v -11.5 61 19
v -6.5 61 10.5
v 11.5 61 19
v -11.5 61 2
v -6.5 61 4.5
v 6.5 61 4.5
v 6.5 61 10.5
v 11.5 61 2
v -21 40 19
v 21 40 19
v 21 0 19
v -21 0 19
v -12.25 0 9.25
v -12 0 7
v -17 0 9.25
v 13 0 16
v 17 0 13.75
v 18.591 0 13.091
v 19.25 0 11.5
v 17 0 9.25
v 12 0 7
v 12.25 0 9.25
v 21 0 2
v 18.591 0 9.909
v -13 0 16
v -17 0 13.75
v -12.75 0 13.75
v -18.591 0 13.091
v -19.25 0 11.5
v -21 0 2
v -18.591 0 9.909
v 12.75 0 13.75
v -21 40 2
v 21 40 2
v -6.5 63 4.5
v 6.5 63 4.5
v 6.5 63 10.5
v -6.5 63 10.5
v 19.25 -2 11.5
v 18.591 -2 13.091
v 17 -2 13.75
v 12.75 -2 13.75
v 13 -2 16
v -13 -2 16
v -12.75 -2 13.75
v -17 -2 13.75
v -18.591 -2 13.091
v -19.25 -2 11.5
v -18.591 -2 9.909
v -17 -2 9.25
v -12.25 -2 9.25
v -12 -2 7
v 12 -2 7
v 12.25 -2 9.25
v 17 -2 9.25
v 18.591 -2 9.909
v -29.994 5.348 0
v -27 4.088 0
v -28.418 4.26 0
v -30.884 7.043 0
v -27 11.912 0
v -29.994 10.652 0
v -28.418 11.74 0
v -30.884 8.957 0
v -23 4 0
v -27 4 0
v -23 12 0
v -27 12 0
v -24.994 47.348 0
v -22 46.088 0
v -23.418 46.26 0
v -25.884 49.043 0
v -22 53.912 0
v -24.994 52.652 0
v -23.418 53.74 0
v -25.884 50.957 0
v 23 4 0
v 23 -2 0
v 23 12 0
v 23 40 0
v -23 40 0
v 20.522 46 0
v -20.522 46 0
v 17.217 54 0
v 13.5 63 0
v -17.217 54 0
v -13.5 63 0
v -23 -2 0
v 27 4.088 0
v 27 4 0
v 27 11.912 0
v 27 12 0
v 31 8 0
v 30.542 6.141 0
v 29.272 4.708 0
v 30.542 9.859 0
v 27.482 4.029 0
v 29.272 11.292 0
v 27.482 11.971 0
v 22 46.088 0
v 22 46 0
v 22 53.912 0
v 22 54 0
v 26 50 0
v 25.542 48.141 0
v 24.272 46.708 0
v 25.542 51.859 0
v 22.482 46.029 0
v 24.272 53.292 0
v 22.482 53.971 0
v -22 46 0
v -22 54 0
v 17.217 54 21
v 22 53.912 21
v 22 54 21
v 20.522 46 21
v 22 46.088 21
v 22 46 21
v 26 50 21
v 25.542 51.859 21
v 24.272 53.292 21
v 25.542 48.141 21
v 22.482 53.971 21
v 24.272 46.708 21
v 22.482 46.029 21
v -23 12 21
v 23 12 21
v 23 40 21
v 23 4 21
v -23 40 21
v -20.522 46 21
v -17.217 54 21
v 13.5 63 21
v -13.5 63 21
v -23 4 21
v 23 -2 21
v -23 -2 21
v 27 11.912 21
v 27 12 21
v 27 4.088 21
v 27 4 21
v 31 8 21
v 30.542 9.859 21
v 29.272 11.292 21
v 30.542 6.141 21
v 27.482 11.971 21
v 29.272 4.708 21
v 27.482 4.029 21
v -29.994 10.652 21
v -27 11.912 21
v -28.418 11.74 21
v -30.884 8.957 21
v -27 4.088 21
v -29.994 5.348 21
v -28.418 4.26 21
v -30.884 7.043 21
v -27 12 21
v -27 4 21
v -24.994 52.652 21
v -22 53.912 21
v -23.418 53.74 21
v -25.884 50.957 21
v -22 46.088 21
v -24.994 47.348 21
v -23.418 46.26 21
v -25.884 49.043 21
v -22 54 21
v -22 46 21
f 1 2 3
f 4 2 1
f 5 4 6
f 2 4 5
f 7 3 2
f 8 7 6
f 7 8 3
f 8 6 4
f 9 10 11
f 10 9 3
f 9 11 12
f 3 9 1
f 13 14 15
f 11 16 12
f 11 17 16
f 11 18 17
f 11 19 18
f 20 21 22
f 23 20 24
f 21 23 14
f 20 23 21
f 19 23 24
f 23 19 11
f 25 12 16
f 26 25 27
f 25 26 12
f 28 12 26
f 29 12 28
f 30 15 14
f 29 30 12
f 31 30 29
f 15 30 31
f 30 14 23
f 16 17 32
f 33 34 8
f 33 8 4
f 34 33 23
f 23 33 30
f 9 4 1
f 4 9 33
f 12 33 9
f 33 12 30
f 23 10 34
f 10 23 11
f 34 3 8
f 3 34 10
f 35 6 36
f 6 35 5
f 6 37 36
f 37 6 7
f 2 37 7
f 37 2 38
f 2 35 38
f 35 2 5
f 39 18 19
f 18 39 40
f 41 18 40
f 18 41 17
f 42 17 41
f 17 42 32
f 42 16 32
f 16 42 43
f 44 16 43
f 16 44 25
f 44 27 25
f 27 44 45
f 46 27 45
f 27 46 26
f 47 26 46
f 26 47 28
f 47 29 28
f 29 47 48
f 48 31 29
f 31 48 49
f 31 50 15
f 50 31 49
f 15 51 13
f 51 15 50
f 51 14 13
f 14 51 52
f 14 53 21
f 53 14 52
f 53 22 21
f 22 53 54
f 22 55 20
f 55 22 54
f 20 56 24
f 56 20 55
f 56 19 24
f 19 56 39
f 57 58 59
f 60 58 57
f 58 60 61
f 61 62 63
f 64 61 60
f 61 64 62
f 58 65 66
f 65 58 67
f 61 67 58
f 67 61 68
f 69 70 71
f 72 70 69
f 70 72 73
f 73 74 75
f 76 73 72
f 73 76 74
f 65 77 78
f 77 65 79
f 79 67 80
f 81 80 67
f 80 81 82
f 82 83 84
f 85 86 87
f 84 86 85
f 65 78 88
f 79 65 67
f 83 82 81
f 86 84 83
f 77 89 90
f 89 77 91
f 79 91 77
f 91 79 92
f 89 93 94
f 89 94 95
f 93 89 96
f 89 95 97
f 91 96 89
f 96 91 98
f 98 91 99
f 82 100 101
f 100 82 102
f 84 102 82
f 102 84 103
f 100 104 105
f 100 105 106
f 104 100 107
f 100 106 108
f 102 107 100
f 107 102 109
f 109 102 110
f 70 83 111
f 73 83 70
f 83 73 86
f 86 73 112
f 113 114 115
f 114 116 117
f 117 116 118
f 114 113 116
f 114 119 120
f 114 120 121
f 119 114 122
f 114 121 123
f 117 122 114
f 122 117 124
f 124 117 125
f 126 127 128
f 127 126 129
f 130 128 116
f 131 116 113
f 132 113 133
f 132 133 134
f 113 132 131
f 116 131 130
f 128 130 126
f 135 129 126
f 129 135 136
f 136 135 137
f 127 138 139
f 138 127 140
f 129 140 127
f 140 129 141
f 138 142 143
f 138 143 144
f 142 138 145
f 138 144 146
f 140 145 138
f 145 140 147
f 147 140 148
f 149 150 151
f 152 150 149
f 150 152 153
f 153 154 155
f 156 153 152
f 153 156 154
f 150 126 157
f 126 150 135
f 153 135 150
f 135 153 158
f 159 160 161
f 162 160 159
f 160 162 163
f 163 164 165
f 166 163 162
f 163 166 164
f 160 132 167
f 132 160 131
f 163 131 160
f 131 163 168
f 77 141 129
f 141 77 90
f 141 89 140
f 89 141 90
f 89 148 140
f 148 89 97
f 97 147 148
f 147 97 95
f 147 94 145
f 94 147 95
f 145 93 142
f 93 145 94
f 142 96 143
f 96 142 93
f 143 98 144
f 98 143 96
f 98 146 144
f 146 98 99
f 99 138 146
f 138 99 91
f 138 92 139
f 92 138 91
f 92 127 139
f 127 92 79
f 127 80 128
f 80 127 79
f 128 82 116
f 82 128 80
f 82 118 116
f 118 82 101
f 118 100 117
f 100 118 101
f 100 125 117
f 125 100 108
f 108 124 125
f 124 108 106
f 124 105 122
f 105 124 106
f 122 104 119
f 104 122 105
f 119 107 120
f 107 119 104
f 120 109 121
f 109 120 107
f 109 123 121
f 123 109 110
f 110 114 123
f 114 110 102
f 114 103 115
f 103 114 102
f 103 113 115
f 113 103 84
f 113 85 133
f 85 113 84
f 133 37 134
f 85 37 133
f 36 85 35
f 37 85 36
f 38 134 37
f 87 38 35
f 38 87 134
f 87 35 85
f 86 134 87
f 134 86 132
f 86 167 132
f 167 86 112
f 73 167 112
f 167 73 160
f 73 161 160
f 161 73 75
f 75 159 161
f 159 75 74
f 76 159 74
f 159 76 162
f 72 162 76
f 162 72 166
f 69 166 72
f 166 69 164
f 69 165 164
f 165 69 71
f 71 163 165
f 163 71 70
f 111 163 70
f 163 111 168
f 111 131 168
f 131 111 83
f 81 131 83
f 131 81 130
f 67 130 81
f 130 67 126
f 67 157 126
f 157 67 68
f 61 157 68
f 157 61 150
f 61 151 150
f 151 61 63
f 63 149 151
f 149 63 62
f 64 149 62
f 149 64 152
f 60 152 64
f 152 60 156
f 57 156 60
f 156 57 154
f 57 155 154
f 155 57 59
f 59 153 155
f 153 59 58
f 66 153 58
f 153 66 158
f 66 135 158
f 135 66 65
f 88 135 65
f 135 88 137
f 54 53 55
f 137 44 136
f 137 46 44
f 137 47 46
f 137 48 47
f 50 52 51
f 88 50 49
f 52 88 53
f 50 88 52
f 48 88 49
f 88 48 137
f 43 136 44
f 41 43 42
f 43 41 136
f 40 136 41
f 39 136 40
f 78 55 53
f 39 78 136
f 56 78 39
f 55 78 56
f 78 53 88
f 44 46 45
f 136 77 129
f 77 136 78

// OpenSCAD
difference(){
    linear_extrude(21)
        union() {
            polygon([[-23,-2],[23,-2],[23,40],[13.5,63],[-13.5,63],[-23,40]]);
            translate([-27,8])
                        circle(d=8);   
            translate([27,8])
                        circle(d=8);   
            polygon([[-27,4],[27,4],[27,12],[-27,12]]);
            polygon([[-22,46],[22,46],[22,54],[-22,54]]);
            translate([-22,50])
                        circle(d=8);   
            translate([22,50])
                        circle(d=8); 
            
        }
    union(){
        translate([0,0,2])
            linear_extrude(17)
                polygon([[-21,0],[21,0],[21,40],[11.5,61],[-11.5,61],[-21,40]]);
        translate([0,0,4.5])
            linear_extrude(6)
                polygon([[-6.5,60],[-6.5,65],[6.5,65],[6.5,60]]);
        translate([0,2,7])
        rotate([90,0,0])
            linear_extrude(10){
                union(){
                    polygon([[-13,9],[13,9],[12,0],[-12,0]]);
                    translate([-17,4.5])
                        circle(d=4.5);    
                    translate([17,4.5])
                        circle(d=4.5);    
                    polygon([[-17,6.75],[17,6.75],[17,2.25],[-17,2.25]]);
                }
            }
            
    }
}
